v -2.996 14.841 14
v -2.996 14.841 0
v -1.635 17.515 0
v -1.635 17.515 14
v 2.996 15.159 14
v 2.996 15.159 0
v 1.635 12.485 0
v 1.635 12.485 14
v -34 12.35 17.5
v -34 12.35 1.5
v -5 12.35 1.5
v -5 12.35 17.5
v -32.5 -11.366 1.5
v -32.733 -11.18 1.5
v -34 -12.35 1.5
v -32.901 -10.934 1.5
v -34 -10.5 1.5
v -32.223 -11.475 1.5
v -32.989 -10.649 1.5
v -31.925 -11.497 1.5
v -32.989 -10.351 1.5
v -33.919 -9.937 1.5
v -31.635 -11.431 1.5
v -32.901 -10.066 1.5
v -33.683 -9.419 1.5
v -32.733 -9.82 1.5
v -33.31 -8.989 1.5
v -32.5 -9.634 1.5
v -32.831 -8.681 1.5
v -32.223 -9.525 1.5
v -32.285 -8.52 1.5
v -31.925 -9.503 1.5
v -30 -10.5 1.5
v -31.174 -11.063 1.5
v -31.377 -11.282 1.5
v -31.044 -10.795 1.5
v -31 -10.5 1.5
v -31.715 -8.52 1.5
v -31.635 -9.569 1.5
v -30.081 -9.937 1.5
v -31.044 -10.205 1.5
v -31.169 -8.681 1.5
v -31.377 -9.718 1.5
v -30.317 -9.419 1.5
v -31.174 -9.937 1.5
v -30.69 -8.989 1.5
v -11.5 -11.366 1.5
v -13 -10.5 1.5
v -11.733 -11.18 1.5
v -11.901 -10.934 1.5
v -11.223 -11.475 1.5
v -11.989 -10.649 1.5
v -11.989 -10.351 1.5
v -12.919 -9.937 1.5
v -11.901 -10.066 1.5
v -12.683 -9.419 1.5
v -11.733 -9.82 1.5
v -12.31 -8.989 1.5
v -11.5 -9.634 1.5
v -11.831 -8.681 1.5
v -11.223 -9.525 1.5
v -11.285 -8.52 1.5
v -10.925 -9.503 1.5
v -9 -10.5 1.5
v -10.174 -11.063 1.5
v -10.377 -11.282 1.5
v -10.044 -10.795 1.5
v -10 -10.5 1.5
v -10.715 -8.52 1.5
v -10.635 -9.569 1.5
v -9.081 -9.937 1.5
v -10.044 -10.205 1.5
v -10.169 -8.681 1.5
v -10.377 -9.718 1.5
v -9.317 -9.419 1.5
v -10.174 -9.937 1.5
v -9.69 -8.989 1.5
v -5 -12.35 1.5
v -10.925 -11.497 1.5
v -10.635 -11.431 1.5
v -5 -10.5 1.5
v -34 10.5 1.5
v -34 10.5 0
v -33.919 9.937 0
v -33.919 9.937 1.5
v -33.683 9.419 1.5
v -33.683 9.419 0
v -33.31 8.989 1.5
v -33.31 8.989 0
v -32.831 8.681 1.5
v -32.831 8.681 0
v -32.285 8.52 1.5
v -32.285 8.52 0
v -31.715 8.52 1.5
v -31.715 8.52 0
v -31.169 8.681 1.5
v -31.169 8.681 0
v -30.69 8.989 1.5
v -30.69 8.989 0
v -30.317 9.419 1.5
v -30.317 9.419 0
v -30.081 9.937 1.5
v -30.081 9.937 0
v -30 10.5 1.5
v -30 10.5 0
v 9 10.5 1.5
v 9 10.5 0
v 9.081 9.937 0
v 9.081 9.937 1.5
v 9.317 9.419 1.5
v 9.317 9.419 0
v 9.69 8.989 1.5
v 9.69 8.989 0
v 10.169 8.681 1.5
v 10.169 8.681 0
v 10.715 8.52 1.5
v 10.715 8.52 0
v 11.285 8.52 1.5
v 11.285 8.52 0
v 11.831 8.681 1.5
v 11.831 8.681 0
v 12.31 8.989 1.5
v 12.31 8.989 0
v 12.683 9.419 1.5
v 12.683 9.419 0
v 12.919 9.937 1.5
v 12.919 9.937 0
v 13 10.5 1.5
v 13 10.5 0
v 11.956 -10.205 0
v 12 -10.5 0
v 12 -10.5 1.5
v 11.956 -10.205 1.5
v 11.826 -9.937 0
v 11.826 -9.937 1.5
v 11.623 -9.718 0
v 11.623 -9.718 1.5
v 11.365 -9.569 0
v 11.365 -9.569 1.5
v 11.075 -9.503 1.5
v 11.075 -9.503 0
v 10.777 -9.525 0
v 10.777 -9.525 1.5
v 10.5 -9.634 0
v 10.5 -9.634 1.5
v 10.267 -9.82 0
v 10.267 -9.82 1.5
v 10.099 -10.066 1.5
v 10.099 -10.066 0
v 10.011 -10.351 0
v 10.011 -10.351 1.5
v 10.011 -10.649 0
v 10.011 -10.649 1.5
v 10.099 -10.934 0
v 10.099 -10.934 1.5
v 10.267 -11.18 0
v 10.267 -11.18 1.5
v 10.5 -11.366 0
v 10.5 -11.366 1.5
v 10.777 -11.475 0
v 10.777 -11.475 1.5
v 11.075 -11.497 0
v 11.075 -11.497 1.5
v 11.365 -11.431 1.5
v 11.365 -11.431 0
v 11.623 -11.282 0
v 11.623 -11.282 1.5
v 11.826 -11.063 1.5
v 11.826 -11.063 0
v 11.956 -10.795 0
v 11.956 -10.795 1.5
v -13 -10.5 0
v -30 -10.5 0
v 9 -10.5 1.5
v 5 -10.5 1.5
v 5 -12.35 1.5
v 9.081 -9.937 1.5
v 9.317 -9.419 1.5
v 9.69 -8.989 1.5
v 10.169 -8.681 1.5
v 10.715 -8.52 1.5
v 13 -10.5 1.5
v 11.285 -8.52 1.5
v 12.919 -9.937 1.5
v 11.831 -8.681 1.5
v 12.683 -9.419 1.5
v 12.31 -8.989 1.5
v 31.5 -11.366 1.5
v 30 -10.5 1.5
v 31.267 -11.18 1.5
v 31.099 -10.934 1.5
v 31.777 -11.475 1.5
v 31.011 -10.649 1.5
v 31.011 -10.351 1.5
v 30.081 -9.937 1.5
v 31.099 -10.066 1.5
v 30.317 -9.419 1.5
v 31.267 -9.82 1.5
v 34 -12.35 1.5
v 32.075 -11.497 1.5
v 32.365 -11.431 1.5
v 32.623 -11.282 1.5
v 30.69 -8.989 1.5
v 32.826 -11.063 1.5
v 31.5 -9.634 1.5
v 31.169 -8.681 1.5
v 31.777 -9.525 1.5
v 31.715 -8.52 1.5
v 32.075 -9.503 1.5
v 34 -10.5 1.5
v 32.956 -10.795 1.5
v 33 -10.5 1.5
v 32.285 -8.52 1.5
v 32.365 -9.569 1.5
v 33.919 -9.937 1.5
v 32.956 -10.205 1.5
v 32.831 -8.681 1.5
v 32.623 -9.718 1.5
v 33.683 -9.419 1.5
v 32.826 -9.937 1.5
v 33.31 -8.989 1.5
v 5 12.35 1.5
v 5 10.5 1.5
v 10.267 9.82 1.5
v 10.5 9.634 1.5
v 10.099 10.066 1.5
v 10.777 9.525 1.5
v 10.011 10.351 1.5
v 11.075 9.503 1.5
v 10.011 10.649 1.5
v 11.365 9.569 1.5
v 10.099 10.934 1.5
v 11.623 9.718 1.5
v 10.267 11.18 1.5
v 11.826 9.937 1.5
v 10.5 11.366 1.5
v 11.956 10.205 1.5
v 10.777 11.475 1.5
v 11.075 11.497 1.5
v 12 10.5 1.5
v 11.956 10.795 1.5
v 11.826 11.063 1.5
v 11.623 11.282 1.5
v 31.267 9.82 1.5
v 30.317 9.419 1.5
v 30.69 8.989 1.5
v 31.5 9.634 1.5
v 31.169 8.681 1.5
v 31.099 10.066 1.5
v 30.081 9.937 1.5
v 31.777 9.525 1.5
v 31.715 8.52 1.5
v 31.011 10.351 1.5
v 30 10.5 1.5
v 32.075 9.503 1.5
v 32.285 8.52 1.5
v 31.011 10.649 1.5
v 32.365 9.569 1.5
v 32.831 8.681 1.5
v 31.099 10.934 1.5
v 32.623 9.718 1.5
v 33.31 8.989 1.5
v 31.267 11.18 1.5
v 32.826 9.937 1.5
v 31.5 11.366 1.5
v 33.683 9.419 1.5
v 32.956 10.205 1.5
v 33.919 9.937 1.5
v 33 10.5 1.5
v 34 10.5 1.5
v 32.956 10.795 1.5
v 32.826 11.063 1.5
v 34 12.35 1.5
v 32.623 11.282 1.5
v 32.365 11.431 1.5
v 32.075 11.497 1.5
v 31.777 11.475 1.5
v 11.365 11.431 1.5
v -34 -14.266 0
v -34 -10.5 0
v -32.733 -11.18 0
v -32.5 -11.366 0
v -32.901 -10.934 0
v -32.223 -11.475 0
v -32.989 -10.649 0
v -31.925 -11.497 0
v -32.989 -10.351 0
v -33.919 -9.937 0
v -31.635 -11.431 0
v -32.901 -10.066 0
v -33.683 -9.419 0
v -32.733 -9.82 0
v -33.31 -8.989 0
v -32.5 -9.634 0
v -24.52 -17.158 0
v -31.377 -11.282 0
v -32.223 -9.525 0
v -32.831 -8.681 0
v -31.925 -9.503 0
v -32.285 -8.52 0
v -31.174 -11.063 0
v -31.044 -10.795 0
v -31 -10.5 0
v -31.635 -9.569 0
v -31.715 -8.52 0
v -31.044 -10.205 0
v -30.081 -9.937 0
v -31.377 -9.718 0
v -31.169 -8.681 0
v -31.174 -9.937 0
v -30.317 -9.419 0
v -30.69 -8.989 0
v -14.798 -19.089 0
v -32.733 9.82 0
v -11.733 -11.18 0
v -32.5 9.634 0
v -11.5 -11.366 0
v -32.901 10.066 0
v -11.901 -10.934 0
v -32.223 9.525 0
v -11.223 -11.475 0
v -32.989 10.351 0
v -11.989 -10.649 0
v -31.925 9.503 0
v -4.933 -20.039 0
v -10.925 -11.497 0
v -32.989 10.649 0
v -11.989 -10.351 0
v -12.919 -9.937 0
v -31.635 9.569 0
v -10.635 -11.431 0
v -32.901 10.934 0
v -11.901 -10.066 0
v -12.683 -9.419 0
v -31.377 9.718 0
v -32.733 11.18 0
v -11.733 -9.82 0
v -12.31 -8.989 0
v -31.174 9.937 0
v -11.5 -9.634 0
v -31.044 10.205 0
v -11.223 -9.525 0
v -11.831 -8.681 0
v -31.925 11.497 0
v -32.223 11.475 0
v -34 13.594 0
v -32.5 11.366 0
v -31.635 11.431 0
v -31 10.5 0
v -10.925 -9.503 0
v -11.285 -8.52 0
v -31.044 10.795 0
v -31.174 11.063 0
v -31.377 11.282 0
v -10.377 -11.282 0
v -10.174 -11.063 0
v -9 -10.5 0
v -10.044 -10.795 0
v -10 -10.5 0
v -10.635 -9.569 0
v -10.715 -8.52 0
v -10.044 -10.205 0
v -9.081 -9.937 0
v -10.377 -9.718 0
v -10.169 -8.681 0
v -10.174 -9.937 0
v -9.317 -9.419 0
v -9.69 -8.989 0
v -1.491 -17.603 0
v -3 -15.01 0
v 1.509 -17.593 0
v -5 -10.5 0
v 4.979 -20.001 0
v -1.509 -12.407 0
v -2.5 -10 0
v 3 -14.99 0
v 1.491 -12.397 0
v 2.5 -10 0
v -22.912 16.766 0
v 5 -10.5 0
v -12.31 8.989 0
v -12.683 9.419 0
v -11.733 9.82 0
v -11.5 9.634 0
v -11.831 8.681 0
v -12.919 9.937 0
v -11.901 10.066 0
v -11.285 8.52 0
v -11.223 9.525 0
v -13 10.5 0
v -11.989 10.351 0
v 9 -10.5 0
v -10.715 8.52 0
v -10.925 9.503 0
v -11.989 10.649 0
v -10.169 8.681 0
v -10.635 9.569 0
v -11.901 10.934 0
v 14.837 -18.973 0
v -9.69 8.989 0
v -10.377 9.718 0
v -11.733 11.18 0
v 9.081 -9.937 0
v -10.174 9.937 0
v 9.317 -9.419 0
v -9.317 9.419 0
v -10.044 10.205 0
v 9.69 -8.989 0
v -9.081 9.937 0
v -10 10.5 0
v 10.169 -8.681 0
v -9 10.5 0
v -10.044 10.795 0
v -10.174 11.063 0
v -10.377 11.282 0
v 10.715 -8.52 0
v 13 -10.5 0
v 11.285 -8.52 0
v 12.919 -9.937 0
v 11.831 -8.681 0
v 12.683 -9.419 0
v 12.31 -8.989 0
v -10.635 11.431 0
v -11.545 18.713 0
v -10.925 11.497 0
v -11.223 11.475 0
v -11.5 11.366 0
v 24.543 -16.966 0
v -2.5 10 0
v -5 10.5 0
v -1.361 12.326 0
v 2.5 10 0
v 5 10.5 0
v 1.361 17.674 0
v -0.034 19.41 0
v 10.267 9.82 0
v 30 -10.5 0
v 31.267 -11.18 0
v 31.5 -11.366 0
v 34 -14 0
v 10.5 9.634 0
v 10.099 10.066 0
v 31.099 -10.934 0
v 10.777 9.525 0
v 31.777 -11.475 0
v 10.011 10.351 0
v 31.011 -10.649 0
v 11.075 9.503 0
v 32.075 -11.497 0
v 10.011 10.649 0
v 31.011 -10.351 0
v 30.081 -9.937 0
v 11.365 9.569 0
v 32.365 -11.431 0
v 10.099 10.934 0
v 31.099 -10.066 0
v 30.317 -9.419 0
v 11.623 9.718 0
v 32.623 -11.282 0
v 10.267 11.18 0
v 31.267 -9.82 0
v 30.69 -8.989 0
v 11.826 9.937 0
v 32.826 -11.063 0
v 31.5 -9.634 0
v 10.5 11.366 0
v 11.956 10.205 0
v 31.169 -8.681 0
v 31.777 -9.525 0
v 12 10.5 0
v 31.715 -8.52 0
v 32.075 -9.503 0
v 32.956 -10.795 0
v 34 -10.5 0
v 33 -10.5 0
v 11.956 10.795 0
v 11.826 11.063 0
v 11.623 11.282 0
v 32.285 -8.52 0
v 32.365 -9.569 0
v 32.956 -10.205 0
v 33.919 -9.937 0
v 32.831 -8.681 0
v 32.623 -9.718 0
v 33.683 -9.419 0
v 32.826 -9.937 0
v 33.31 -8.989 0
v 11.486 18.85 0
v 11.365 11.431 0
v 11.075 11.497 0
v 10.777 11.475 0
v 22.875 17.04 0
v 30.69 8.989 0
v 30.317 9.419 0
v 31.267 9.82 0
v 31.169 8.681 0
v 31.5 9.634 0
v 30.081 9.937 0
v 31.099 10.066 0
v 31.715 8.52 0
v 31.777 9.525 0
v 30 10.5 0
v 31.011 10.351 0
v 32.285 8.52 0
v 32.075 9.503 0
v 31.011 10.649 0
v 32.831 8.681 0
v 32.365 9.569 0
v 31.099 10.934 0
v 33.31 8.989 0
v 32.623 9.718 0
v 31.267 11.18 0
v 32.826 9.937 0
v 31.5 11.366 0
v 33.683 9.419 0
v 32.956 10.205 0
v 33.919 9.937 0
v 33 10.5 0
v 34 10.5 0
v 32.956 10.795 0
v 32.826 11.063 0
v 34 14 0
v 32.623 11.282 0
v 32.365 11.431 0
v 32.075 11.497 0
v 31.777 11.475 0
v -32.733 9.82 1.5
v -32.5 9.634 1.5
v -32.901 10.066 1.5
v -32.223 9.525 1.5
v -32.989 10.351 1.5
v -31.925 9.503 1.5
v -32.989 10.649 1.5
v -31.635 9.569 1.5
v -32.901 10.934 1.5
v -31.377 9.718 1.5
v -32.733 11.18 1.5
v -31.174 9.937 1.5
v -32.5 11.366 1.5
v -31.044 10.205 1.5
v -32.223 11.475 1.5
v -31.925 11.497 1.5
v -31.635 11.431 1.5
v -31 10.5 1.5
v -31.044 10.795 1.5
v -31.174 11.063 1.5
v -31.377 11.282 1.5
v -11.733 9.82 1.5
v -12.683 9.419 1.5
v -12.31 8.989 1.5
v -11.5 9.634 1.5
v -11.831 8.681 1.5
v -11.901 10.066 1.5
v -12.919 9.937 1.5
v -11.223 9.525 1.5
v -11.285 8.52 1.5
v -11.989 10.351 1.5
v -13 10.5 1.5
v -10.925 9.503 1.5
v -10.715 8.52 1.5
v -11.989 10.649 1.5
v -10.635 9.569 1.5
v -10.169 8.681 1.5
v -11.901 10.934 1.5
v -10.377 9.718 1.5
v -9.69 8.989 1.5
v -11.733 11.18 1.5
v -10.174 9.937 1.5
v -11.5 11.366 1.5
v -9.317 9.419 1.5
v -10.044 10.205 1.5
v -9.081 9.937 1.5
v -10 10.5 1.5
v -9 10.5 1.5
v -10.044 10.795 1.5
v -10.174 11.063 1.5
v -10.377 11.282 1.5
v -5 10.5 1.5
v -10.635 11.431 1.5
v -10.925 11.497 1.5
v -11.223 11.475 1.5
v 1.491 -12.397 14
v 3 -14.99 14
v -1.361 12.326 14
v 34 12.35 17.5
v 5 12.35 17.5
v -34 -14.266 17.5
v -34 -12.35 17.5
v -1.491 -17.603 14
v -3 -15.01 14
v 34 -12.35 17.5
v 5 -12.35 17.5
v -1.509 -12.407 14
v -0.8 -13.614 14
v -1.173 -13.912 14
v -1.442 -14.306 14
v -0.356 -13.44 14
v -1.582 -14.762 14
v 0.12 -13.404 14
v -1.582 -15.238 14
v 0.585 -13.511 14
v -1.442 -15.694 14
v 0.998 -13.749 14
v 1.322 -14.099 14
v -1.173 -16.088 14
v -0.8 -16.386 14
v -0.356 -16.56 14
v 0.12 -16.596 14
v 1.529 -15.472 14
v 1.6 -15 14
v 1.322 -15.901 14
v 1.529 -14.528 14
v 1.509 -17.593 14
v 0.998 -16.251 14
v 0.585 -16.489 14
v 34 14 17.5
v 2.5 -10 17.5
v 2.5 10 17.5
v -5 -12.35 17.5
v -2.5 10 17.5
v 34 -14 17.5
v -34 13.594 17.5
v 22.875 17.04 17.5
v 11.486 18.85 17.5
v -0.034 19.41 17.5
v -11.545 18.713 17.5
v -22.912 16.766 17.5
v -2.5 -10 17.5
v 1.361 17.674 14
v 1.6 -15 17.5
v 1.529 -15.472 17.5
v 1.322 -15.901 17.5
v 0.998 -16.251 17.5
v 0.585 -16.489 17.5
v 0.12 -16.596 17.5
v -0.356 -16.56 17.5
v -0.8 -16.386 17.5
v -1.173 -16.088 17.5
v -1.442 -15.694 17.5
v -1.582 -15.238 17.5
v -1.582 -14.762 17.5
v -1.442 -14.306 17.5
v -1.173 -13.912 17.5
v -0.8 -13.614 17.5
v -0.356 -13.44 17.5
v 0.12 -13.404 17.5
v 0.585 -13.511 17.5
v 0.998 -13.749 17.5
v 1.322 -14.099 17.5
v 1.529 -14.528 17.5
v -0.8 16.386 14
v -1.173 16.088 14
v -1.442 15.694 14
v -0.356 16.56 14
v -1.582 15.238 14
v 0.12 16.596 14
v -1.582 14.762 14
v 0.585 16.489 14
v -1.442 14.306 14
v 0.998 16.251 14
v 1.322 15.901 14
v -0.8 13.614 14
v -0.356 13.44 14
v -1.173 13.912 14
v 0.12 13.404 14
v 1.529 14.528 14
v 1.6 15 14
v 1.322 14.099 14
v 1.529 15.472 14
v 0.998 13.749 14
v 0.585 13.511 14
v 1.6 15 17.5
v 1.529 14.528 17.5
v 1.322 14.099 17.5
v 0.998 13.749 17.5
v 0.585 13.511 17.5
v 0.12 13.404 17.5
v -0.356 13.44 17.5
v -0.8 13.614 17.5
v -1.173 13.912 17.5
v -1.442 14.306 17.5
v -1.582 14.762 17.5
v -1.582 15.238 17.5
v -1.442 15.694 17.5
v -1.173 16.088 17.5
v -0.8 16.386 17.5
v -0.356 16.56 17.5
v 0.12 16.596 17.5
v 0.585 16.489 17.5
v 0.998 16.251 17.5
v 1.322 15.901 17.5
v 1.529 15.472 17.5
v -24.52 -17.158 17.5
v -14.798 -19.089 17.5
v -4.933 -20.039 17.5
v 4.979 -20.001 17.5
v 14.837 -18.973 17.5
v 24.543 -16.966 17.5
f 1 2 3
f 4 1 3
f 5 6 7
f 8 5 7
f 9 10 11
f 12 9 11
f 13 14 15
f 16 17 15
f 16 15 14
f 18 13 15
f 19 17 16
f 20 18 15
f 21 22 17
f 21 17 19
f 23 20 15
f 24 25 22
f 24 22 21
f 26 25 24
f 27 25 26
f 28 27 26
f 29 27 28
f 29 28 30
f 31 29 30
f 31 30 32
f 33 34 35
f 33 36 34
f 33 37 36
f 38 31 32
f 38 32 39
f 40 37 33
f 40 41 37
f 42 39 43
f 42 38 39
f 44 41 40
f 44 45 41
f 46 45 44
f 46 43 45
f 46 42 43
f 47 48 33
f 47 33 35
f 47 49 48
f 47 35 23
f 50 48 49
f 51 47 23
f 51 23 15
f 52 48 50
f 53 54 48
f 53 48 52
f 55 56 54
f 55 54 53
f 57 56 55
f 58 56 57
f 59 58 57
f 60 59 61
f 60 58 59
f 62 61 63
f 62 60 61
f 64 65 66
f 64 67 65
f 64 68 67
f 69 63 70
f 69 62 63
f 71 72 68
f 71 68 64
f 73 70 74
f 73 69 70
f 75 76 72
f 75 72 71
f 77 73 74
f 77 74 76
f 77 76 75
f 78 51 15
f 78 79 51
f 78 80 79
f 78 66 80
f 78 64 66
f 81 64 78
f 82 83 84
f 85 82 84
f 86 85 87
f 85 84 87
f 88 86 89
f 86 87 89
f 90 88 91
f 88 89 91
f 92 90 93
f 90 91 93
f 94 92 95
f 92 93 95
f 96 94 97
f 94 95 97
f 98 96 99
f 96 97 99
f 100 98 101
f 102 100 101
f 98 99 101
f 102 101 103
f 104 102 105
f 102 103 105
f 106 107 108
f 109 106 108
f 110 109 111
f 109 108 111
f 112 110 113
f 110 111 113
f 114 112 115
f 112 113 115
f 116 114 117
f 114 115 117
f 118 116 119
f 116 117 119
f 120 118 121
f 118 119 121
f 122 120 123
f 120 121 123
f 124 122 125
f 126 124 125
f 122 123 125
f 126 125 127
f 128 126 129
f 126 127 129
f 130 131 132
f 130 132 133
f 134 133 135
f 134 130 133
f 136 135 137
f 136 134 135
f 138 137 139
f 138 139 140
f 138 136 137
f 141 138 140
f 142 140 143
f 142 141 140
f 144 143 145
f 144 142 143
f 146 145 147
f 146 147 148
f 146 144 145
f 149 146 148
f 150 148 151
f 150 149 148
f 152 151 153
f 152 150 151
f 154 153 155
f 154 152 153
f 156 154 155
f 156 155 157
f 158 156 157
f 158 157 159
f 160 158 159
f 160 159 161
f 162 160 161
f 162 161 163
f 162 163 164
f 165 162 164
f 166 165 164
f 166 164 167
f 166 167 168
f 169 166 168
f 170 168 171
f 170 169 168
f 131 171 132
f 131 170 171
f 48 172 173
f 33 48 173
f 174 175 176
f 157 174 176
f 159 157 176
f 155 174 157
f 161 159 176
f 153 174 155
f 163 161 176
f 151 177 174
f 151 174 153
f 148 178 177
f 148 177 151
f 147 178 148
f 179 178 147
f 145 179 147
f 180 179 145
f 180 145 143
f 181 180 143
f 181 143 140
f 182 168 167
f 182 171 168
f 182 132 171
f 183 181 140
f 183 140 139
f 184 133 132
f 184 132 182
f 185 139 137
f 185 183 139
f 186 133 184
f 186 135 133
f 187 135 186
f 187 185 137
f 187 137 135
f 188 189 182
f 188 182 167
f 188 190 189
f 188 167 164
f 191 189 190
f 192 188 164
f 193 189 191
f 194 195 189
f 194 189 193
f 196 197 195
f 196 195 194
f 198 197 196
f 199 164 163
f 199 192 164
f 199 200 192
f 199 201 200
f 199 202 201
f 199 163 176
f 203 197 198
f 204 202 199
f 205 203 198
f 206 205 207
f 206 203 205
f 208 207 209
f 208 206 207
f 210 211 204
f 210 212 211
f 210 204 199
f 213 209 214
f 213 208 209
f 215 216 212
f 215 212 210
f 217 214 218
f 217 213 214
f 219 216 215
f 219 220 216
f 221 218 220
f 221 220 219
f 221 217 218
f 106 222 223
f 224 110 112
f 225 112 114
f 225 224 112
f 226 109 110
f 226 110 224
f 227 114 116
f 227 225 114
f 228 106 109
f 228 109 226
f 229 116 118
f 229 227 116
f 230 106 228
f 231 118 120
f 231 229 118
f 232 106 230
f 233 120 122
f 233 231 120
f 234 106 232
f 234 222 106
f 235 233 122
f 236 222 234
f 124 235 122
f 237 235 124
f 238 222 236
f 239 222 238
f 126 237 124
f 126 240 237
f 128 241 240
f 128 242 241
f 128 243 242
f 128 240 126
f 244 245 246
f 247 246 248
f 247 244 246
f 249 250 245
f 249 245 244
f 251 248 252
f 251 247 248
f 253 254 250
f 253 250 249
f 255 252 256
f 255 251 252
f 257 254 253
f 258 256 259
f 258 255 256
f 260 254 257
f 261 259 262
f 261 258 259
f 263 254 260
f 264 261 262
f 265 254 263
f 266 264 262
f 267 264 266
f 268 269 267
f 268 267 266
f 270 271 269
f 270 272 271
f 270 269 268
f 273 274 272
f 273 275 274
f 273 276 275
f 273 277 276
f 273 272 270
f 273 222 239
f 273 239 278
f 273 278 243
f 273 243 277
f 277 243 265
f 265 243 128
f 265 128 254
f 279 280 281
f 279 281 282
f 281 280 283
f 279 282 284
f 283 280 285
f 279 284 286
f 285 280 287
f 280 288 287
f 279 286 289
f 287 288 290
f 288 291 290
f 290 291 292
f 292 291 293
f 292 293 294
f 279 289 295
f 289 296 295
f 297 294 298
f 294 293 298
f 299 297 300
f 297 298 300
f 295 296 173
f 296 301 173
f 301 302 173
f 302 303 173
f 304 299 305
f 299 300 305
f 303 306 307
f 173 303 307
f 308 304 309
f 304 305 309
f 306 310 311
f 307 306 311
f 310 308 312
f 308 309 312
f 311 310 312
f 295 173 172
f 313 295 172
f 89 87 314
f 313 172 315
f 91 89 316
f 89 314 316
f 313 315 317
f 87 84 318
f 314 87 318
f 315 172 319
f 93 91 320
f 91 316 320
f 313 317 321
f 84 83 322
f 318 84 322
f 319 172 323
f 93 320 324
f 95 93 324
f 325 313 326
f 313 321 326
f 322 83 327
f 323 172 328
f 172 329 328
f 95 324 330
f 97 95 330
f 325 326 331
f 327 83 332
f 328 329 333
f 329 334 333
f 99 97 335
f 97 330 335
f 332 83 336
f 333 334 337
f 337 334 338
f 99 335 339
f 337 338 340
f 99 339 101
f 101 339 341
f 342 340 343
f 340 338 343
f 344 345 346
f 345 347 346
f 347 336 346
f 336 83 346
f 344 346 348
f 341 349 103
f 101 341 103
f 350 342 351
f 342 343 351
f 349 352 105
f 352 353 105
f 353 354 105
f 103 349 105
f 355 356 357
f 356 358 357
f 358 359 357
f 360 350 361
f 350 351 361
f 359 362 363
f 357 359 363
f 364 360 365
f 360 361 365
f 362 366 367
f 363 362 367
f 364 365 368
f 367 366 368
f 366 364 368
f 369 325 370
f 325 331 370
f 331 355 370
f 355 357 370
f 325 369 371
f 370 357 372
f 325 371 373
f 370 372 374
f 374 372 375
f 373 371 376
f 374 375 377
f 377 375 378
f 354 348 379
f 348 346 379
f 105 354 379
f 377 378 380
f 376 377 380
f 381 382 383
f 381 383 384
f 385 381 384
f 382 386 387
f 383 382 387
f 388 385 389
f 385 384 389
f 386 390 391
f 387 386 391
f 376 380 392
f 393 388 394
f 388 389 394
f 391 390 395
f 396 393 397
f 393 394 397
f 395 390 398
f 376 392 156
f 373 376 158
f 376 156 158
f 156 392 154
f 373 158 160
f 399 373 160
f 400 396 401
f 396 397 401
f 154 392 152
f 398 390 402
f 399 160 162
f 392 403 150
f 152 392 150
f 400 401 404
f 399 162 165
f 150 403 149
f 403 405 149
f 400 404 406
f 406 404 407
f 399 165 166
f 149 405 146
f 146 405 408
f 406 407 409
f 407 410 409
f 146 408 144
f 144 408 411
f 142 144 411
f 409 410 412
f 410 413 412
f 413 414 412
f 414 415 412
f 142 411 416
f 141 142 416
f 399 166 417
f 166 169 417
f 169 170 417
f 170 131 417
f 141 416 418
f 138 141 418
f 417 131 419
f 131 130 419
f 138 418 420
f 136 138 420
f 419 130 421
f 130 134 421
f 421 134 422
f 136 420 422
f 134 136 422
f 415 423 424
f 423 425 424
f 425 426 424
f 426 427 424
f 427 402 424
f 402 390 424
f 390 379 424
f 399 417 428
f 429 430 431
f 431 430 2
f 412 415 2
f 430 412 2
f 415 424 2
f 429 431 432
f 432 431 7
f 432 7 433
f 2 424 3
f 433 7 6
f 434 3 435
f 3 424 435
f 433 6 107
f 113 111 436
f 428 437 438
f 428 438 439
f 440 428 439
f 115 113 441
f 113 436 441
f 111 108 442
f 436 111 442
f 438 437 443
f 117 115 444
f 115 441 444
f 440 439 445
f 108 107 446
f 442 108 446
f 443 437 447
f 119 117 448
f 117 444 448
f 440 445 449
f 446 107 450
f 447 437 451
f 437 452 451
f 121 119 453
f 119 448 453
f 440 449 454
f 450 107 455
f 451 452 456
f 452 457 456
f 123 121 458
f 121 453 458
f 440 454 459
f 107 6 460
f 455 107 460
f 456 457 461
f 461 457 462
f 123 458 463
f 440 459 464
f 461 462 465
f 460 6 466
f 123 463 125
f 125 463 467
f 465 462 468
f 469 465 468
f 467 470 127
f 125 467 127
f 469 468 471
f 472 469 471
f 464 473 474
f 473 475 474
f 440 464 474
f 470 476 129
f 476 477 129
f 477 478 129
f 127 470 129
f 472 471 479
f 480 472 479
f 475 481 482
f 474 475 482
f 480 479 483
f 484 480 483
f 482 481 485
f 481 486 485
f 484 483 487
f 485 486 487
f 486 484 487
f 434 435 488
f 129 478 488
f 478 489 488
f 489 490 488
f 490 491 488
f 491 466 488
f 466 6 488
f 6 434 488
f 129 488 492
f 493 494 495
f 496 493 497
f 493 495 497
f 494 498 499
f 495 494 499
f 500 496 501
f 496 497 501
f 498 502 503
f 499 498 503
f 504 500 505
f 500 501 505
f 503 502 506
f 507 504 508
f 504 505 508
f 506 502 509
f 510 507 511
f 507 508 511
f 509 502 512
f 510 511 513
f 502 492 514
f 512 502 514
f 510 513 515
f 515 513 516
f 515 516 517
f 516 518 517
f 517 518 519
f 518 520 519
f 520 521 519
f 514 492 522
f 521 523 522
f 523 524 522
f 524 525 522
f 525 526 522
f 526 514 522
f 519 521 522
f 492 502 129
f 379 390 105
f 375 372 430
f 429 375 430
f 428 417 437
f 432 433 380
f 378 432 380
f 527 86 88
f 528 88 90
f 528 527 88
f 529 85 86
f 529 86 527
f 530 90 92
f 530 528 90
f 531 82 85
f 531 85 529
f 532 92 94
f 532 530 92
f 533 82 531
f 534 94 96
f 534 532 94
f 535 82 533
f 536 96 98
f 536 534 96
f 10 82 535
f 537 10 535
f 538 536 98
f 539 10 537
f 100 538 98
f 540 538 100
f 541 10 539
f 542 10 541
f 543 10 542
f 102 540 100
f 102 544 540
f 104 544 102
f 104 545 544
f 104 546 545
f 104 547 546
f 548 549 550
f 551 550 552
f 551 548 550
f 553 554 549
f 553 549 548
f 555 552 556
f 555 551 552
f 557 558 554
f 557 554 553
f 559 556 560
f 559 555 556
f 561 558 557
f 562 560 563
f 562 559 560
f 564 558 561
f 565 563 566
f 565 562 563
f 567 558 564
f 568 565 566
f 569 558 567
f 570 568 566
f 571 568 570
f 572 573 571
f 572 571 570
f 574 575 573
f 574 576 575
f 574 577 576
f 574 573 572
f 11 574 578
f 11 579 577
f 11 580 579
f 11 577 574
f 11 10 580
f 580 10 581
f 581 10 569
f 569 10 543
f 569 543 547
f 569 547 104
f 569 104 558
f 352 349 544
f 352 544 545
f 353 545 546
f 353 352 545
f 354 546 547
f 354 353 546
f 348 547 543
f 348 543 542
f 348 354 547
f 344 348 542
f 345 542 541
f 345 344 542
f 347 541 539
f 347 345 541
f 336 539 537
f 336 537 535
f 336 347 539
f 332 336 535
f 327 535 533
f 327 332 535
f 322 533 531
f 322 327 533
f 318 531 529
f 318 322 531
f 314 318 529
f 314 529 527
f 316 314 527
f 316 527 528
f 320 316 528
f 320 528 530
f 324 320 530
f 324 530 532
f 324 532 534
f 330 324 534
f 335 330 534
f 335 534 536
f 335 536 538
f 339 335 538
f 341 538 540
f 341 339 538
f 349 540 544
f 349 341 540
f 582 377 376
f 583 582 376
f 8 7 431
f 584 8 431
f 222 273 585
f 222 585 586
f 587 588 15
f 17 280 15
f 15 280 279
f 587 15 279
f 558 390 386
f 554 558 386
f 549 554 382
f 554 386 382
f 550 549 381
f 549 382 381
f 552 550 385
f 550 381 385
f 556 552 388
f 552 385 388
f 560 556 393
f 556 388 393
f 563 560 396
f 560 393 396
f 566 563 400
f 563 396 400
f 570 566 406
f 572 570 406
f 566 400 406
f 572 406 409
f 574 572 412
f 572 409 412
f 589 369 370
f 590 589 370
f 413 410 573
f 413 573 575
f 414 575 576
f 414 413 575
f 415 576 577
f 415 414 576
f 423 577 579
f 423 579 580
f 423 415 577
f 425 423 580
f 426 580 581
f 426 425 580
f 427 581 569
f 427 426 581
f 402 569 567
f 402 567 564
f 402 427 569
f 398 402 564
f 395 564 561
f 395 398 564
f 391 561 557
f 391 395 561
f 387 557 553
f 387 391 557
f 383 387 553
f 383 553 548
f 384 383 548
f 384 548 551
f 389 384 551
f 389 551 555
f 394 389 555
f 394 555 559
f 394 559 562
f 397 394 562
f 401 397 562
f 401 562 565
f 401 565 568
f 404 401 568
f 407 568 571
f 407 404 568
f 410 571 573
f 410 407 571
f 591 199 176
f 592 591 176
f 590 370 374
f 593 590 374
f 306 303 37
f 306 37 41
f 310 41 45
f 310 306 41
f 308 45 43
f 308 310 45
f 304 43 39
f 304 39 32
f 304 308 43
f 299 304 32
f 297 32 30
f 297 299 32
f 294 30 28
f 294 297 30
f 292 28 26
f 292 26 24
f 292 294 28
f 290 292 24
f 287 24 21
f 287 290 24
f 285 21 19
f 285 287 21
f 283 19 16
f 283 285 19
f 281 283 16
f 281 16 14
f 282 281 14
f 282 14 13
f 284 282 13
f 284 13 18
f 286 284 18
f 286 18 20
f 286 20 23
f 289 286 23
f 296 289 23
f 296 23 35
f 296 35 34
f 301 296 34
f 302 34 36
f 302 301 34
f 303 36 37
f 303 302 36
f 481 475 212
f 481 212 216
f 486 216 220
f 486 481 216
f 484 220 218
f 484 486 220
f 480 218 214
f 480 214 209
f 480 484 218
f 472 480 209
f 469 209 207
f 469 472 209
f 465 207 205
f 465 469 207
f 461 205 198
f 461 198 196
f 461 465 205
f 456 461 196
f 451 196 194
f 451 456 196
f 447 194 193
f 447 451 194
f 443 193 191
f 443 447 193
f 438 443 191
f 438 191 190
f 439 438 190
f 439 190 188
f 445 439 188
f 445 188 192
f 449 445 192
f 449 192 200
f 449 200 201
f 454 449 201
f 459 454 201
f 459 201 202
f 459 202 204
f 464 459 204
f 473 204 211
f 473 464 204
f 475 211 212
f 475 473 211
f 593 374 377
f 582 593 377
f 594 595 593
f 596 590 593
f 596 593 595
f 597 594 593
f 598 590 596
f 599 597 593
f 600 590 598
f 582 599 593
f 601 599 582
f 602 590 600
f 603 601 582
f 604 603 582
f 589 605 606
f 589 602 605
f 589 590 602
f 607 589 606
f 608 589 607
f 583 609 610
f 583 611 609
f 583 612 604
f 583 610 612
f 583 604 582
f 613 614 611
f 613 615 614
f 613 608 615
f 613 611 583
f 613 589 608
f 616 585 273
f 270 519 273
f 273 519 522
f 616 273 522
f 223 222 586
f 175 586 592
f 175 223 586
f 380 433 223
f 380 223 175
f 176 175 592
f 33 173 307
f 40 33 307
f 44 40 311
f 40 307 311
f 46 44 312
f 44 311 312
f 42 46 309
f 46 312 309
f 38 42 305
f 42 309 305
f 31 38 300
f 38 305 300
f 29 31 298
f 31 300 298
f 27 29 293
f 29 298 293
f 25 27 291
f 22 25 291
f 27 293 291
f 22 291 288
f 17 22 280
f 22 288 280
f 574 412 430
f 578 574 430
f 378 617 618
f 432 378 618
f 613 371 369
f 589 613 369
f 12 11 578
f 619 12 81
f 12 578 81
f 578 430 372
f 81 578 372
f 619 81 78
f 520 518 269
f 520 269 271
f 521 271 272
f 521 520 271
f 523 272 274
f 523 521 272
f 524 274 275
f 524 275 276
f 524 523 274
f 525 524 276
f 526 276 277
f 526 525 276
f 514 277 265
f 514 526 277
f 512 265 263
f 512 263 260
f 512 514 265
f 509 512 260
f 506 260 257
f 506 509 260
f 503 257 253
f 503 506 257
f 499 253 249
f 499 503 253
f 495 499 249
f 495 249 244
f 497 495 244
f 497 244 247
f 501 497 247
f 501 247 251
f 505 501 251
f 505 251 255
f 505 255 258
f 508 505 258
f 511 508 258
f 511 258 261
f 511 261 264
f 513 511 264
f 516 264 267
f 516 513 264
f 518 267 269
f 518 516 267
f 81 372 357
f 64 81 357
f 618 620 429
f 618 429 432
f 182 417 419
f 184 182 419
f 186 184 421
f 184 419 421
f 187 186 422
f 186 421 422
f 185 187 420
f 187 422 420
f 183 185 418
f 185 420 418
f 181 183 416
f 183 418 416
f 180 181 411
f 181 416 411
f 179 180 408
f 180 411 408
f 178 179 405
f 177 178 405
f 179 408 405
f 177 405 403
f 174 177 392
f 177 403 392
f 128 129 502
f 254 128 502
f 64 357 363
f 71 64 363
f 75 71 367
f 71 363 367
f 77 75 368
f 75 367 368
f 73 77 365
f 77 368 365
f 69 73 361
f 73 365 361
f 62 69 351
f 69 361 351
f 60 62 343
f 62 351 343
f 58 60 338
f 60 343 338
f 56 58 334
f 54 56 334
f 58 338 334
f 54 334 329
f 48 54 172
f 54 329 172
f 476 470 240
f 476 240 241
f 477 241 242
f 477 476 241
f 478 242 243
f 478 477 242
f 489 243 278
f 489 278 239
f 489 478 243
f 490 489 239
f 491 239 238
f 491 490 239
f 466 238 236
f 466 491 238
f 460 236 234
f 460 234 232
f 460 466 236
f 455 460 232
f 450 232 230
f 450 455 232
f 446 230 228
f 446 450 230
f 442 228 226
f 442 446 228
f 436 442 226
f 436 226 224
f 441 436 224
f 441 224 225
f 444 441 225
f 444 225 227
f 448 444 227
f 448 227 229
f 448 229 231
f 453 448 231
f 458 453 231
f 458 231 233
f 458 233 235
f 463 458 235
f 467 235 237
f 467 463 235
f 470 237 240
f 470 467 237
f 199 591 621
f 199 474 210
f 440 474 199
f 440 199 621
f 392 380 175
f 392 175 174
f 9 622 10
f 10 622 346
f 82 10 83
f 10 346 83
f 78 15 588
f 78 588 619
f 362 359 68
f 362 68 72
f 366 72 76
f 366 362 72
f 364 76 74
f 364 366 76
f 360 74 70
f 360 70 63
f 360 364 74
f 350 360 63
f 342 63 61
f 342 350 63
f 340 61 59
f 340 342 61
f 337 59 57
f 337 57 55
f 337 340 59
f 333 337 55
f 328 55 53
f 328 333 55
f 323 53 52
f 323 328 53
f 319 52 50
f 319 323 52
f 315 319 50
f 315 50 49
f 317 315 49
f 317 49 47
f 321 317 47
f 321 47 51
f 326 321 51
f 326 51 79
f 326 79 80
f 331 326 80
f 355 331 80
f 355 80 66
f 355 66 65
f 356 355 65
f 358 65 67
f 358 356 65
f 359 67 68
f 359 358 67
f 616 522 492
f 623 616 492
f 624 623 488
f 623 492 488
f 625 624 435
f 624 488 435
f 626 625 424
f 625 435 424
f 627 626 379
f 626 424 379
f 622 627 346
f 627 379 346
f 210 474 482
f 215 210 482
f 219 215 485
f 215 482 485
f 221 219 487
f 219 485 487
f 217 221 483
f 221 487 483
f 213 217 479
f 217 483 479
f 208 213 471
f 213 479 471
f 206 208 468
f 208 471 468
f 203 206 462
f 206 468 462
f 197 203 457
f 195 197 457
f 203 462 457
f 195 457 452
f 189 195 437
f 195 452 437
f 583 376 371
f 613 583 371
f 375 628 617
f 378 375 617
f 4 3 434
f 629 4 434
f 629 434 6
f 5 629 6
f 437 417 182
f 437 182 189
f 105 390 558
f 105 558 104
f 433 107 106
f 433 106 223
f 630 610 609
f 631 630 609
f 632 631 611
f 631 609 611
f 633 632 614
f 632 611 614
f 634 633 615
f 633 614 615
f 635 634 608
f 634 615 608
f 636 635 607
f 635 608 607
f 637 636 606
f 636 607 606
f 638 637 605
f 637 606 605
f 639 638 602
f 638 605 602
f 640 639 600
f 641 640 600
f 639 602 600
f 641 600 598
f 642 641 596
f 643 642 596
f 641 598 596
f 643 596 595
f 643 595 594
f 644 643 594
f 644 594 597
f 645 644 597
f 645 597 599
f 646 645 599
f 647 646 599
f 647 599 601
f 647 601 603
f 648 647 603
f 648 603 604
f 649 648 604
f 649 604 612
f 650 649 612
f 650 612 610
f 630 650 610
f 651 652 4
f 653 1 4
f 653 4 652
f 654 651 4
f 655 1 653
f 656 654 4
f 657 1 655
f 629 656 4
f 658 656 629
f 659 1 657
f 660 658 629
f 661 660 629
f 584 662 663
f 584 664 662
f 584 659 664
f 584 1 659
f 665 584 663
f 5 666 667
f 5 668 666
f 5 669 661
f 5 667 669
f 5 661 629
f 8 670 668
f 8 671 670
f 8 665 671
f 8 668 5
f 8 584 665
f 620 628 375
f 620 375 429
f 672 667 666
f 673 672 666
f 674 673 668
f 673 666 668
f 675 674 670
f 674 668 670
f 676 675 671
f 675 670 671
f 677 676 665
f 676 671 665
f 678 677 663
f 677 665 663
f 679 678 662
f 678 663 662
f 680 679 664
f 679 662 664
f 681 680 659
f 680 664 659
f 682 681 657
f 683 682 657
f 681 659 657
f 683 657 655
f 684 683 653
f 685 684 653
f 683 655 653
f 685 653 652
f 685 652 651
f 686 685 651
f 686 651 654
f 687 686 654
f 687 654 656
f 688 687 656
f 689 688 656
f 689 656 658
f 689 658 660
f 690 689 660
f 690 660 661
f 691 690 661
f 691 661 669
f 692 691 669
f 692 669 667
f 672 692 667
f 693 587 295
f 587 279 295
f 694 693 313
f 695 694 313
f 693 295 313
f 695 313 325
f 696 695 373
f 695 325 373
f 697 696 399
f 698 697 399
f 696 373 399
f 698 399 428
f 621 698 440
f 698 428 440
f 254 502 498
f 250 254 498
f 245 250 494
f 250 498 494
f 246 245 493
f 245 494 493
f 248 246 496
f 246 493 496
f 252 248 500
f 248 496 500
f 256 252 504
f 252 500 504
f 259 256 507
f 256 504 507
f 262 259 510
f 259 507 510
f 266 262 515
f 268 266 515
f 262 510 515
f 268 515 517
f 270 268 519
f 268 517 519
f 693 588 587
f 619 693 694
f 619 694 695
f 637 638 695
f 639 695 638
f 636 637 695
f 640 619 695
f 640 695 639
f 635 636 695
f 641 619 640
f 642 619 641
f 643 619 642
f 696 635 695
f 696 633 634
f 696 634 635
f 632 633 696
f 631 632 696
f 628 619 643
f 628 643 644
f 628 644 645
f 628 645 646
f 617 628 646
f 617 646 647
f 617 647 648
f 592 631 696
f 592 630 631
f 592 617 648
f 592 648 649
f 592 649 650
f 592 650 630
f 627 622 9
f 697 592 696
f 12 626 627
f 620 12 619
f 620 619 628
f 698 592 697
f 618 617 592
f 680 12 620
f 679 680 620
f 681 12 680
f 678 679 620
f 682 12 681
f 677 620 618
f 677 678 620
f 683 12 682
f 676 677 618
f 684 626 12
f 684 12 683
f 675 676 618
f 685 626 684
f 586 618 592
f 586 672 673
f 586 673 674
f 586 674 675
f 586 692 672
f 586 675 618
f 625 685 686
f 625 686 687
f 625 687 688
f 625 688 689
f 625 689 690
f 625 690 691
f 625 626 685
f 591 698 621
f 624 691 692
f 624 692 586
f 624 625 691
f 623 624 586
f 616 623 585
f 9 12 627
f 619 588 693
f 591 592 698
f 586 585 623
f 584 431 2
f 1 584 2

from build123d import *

# Parameters (mm, degrees)
SKETCH_R        = 1
PAD_DEPTH       = 1.5
PAD001_DEPTH    = 16
SKETCH002_R     = 1.6
POCKET_DEPTH    = 30
POCKET001_DEPTH = 14
SKETCH004_W     = 5
SKETCH004_H     = 20
POCKET002_DEPTH = 20


with BuildPart() as part:
    # Sketch → Pad (new body)
    with BuildSketch(Plane.XY):
        with BuildLine():
            Line((13, 10.5), (30, 10.5))
            ThreePointArc((30, 10.5), (32, 8.5), (34, 10.5))
            Line((34, 10.5), (34, 14))
            ThreePointArc((34, 14), (-0.033512, 19.410124), (-34, 13.594018))
            Line((-34, 10.5), (-34, 13.594018))
            ThreePointArc((-34, 10.5), (-32, 8.5), (-30, 10.5))
            Line((-13, 10.5), (-30, 10.5))
            ThreePointArc((-13, 10.5), (-11, 8.5), (-9, 10.5))
            Line((-9, 10.5), (-5, 10.5))
            Line((-5, 10.5), (-5, -10.5))
            Line((-5, -10.5), (-9, -10.5))
            ThreePointArc((-9, -10.5), (-11, -8.5), (-13, -10.5))
            Line((-13, -10.5), (-30, -10.5))
            ThreePointArc((-30, -10.5), (-32, -8.5), (-34, -10.5))
            Line((-34, -10.5), (-34, -14.265938))
            ThreePointArc((-34, -14.265938), (0.023508, -20.143886), (34, -14))
            Line((34, -10.5), (34, -14))
            ThreePointArc((34, -10.5), (32, -8.5), (30, -10.5))
            Line((13, -10.5), (30, -10.5))
            ThreePointArc((13, -10.5), (11, -8.5), (9, -10.5))
            Line((5, -10.5), (9, -10.5))
            Line((5, 10.5), (5, -10.5))
            Line((9, 10.5), (5, 10.5))
            ThreePointArc((9, 10.5), (11, 8.5), (13, 10.5))
        make_face()
        with Locations((11, 10.5)):
            Circle(SKETCH_R, mode=Mode.SUBTRACT)
        with Locations((11, -10.5)):
            Circle(SKETCH_R, mode=Mode.SUBTRACT)
        with Locations((32, 10.5)):
            Circle(SKETCH_R, mode=Mode.SUBTRACT)
        with Locations((32, -10.5)):
            Circle(SKETCH_R, mode=Mode.SUBTRACT)
        with Locations((-11, 10.5)):
            Circle(SKETCH_R, mode=Mode.SUBTRACT)
        with Locations((-11, -10.5)):
            Circle(SKETCH_R, mode=Mode.SUBTRACT)
        with Locations((-32, 10.5)):
            Circle(SKETCH_R, mode=Mode.SUBTRACT)
        with Locations((-32, -10.5)):
            Circle(SKETCH_R, mode=Mode.SUBTRACT)
    extrude(amount=PAD_DEPTH)

    # Sketch001 → Pad001 (new body)
    with BuildSketch(Plane.XY.offset(1.5)):
        with BuildLine():
            Line((-34, 12.35), (-5, 12.35))
            Line((-5, 12.35), (-5, 10.5))
            Line((-5, 10.5), (-5, -10.5))
            Line((-5, -10.5), (-5, -12.35))
            Line((-34, -12.35), (-5, -12.35))
            Line((-34, -12.35), (-34, -14.265938))
            ThreePointArc((-34, -14.265938), (0.023508, -20.143886), (34, -14))
            Line((34, -12.35), (34, -14))
            Line((34, -12.35), (5, -12.35))
            Line((5, -10.5), (5, -12.35))
            Line((5, 10.5), (5, -10.5))
            Line((5, 12.35), (5, 10.5))
            Line((34, 12.35), (5, 12.35))
            Line((34, 12.35), (34, 14))
            ThreePointArc((34, 14), (-0.033512, 19.410124), (-34, 13.594018))
            Line((-34, 13.594018), (-34, 12.35))
        make_face()
    extrude(amount=PAD001_DEPTH)

    # Sketch002 → Pocket (cut)
    with BuildSketch(Plane(origin=(0, 0, 0), x_dir=(1, 0, 0), z_dir=(0, 0, -1))):
        with Locations((0, 15)):
            Circle(SKETCH002_R)
        with Locations((0, -15)):
            Circle(SKETCH002_R)
    extrude(amount=-POCKET_DEPTH, mode=Mode.SUBTRACT)

    # Sketch003 → Pocket001 (cut)
    with BuildSketch(Plane(origin=(0, 0, 0), x_dir=(1, 0, 0), z_dir=(0, 0, -1))):
        Polygon((1.491232, 12.396881), (2.999983, 14.989885), (1.508751, 17.593004), (-1.491232, 17.603119), (-2.999983, 15.010115), (-1.508751, 12.406996), align=None)
        Polygon((1.360539, -17.673749), (2.995804, -15.158613), (1.635265, -12.484864), (-1.360539, -12.326251), (-2.995804, -14.841387), (-1.635265, -17.515136), align=None)
    extrude(amount=-POCKET001_DEPTH, mode=Mode.SUBTRACT)

    # Sketch004 → Pocket002 (cut)
    with BuildSketch(Plane.XY.offset(17.5)):
        Rectangle(SKETCH004_W, SKETCH004_H)
    extrude(amount=-POCKET002_DEPTH, mode=Mode.SUBTRACT)


solid = part.part
